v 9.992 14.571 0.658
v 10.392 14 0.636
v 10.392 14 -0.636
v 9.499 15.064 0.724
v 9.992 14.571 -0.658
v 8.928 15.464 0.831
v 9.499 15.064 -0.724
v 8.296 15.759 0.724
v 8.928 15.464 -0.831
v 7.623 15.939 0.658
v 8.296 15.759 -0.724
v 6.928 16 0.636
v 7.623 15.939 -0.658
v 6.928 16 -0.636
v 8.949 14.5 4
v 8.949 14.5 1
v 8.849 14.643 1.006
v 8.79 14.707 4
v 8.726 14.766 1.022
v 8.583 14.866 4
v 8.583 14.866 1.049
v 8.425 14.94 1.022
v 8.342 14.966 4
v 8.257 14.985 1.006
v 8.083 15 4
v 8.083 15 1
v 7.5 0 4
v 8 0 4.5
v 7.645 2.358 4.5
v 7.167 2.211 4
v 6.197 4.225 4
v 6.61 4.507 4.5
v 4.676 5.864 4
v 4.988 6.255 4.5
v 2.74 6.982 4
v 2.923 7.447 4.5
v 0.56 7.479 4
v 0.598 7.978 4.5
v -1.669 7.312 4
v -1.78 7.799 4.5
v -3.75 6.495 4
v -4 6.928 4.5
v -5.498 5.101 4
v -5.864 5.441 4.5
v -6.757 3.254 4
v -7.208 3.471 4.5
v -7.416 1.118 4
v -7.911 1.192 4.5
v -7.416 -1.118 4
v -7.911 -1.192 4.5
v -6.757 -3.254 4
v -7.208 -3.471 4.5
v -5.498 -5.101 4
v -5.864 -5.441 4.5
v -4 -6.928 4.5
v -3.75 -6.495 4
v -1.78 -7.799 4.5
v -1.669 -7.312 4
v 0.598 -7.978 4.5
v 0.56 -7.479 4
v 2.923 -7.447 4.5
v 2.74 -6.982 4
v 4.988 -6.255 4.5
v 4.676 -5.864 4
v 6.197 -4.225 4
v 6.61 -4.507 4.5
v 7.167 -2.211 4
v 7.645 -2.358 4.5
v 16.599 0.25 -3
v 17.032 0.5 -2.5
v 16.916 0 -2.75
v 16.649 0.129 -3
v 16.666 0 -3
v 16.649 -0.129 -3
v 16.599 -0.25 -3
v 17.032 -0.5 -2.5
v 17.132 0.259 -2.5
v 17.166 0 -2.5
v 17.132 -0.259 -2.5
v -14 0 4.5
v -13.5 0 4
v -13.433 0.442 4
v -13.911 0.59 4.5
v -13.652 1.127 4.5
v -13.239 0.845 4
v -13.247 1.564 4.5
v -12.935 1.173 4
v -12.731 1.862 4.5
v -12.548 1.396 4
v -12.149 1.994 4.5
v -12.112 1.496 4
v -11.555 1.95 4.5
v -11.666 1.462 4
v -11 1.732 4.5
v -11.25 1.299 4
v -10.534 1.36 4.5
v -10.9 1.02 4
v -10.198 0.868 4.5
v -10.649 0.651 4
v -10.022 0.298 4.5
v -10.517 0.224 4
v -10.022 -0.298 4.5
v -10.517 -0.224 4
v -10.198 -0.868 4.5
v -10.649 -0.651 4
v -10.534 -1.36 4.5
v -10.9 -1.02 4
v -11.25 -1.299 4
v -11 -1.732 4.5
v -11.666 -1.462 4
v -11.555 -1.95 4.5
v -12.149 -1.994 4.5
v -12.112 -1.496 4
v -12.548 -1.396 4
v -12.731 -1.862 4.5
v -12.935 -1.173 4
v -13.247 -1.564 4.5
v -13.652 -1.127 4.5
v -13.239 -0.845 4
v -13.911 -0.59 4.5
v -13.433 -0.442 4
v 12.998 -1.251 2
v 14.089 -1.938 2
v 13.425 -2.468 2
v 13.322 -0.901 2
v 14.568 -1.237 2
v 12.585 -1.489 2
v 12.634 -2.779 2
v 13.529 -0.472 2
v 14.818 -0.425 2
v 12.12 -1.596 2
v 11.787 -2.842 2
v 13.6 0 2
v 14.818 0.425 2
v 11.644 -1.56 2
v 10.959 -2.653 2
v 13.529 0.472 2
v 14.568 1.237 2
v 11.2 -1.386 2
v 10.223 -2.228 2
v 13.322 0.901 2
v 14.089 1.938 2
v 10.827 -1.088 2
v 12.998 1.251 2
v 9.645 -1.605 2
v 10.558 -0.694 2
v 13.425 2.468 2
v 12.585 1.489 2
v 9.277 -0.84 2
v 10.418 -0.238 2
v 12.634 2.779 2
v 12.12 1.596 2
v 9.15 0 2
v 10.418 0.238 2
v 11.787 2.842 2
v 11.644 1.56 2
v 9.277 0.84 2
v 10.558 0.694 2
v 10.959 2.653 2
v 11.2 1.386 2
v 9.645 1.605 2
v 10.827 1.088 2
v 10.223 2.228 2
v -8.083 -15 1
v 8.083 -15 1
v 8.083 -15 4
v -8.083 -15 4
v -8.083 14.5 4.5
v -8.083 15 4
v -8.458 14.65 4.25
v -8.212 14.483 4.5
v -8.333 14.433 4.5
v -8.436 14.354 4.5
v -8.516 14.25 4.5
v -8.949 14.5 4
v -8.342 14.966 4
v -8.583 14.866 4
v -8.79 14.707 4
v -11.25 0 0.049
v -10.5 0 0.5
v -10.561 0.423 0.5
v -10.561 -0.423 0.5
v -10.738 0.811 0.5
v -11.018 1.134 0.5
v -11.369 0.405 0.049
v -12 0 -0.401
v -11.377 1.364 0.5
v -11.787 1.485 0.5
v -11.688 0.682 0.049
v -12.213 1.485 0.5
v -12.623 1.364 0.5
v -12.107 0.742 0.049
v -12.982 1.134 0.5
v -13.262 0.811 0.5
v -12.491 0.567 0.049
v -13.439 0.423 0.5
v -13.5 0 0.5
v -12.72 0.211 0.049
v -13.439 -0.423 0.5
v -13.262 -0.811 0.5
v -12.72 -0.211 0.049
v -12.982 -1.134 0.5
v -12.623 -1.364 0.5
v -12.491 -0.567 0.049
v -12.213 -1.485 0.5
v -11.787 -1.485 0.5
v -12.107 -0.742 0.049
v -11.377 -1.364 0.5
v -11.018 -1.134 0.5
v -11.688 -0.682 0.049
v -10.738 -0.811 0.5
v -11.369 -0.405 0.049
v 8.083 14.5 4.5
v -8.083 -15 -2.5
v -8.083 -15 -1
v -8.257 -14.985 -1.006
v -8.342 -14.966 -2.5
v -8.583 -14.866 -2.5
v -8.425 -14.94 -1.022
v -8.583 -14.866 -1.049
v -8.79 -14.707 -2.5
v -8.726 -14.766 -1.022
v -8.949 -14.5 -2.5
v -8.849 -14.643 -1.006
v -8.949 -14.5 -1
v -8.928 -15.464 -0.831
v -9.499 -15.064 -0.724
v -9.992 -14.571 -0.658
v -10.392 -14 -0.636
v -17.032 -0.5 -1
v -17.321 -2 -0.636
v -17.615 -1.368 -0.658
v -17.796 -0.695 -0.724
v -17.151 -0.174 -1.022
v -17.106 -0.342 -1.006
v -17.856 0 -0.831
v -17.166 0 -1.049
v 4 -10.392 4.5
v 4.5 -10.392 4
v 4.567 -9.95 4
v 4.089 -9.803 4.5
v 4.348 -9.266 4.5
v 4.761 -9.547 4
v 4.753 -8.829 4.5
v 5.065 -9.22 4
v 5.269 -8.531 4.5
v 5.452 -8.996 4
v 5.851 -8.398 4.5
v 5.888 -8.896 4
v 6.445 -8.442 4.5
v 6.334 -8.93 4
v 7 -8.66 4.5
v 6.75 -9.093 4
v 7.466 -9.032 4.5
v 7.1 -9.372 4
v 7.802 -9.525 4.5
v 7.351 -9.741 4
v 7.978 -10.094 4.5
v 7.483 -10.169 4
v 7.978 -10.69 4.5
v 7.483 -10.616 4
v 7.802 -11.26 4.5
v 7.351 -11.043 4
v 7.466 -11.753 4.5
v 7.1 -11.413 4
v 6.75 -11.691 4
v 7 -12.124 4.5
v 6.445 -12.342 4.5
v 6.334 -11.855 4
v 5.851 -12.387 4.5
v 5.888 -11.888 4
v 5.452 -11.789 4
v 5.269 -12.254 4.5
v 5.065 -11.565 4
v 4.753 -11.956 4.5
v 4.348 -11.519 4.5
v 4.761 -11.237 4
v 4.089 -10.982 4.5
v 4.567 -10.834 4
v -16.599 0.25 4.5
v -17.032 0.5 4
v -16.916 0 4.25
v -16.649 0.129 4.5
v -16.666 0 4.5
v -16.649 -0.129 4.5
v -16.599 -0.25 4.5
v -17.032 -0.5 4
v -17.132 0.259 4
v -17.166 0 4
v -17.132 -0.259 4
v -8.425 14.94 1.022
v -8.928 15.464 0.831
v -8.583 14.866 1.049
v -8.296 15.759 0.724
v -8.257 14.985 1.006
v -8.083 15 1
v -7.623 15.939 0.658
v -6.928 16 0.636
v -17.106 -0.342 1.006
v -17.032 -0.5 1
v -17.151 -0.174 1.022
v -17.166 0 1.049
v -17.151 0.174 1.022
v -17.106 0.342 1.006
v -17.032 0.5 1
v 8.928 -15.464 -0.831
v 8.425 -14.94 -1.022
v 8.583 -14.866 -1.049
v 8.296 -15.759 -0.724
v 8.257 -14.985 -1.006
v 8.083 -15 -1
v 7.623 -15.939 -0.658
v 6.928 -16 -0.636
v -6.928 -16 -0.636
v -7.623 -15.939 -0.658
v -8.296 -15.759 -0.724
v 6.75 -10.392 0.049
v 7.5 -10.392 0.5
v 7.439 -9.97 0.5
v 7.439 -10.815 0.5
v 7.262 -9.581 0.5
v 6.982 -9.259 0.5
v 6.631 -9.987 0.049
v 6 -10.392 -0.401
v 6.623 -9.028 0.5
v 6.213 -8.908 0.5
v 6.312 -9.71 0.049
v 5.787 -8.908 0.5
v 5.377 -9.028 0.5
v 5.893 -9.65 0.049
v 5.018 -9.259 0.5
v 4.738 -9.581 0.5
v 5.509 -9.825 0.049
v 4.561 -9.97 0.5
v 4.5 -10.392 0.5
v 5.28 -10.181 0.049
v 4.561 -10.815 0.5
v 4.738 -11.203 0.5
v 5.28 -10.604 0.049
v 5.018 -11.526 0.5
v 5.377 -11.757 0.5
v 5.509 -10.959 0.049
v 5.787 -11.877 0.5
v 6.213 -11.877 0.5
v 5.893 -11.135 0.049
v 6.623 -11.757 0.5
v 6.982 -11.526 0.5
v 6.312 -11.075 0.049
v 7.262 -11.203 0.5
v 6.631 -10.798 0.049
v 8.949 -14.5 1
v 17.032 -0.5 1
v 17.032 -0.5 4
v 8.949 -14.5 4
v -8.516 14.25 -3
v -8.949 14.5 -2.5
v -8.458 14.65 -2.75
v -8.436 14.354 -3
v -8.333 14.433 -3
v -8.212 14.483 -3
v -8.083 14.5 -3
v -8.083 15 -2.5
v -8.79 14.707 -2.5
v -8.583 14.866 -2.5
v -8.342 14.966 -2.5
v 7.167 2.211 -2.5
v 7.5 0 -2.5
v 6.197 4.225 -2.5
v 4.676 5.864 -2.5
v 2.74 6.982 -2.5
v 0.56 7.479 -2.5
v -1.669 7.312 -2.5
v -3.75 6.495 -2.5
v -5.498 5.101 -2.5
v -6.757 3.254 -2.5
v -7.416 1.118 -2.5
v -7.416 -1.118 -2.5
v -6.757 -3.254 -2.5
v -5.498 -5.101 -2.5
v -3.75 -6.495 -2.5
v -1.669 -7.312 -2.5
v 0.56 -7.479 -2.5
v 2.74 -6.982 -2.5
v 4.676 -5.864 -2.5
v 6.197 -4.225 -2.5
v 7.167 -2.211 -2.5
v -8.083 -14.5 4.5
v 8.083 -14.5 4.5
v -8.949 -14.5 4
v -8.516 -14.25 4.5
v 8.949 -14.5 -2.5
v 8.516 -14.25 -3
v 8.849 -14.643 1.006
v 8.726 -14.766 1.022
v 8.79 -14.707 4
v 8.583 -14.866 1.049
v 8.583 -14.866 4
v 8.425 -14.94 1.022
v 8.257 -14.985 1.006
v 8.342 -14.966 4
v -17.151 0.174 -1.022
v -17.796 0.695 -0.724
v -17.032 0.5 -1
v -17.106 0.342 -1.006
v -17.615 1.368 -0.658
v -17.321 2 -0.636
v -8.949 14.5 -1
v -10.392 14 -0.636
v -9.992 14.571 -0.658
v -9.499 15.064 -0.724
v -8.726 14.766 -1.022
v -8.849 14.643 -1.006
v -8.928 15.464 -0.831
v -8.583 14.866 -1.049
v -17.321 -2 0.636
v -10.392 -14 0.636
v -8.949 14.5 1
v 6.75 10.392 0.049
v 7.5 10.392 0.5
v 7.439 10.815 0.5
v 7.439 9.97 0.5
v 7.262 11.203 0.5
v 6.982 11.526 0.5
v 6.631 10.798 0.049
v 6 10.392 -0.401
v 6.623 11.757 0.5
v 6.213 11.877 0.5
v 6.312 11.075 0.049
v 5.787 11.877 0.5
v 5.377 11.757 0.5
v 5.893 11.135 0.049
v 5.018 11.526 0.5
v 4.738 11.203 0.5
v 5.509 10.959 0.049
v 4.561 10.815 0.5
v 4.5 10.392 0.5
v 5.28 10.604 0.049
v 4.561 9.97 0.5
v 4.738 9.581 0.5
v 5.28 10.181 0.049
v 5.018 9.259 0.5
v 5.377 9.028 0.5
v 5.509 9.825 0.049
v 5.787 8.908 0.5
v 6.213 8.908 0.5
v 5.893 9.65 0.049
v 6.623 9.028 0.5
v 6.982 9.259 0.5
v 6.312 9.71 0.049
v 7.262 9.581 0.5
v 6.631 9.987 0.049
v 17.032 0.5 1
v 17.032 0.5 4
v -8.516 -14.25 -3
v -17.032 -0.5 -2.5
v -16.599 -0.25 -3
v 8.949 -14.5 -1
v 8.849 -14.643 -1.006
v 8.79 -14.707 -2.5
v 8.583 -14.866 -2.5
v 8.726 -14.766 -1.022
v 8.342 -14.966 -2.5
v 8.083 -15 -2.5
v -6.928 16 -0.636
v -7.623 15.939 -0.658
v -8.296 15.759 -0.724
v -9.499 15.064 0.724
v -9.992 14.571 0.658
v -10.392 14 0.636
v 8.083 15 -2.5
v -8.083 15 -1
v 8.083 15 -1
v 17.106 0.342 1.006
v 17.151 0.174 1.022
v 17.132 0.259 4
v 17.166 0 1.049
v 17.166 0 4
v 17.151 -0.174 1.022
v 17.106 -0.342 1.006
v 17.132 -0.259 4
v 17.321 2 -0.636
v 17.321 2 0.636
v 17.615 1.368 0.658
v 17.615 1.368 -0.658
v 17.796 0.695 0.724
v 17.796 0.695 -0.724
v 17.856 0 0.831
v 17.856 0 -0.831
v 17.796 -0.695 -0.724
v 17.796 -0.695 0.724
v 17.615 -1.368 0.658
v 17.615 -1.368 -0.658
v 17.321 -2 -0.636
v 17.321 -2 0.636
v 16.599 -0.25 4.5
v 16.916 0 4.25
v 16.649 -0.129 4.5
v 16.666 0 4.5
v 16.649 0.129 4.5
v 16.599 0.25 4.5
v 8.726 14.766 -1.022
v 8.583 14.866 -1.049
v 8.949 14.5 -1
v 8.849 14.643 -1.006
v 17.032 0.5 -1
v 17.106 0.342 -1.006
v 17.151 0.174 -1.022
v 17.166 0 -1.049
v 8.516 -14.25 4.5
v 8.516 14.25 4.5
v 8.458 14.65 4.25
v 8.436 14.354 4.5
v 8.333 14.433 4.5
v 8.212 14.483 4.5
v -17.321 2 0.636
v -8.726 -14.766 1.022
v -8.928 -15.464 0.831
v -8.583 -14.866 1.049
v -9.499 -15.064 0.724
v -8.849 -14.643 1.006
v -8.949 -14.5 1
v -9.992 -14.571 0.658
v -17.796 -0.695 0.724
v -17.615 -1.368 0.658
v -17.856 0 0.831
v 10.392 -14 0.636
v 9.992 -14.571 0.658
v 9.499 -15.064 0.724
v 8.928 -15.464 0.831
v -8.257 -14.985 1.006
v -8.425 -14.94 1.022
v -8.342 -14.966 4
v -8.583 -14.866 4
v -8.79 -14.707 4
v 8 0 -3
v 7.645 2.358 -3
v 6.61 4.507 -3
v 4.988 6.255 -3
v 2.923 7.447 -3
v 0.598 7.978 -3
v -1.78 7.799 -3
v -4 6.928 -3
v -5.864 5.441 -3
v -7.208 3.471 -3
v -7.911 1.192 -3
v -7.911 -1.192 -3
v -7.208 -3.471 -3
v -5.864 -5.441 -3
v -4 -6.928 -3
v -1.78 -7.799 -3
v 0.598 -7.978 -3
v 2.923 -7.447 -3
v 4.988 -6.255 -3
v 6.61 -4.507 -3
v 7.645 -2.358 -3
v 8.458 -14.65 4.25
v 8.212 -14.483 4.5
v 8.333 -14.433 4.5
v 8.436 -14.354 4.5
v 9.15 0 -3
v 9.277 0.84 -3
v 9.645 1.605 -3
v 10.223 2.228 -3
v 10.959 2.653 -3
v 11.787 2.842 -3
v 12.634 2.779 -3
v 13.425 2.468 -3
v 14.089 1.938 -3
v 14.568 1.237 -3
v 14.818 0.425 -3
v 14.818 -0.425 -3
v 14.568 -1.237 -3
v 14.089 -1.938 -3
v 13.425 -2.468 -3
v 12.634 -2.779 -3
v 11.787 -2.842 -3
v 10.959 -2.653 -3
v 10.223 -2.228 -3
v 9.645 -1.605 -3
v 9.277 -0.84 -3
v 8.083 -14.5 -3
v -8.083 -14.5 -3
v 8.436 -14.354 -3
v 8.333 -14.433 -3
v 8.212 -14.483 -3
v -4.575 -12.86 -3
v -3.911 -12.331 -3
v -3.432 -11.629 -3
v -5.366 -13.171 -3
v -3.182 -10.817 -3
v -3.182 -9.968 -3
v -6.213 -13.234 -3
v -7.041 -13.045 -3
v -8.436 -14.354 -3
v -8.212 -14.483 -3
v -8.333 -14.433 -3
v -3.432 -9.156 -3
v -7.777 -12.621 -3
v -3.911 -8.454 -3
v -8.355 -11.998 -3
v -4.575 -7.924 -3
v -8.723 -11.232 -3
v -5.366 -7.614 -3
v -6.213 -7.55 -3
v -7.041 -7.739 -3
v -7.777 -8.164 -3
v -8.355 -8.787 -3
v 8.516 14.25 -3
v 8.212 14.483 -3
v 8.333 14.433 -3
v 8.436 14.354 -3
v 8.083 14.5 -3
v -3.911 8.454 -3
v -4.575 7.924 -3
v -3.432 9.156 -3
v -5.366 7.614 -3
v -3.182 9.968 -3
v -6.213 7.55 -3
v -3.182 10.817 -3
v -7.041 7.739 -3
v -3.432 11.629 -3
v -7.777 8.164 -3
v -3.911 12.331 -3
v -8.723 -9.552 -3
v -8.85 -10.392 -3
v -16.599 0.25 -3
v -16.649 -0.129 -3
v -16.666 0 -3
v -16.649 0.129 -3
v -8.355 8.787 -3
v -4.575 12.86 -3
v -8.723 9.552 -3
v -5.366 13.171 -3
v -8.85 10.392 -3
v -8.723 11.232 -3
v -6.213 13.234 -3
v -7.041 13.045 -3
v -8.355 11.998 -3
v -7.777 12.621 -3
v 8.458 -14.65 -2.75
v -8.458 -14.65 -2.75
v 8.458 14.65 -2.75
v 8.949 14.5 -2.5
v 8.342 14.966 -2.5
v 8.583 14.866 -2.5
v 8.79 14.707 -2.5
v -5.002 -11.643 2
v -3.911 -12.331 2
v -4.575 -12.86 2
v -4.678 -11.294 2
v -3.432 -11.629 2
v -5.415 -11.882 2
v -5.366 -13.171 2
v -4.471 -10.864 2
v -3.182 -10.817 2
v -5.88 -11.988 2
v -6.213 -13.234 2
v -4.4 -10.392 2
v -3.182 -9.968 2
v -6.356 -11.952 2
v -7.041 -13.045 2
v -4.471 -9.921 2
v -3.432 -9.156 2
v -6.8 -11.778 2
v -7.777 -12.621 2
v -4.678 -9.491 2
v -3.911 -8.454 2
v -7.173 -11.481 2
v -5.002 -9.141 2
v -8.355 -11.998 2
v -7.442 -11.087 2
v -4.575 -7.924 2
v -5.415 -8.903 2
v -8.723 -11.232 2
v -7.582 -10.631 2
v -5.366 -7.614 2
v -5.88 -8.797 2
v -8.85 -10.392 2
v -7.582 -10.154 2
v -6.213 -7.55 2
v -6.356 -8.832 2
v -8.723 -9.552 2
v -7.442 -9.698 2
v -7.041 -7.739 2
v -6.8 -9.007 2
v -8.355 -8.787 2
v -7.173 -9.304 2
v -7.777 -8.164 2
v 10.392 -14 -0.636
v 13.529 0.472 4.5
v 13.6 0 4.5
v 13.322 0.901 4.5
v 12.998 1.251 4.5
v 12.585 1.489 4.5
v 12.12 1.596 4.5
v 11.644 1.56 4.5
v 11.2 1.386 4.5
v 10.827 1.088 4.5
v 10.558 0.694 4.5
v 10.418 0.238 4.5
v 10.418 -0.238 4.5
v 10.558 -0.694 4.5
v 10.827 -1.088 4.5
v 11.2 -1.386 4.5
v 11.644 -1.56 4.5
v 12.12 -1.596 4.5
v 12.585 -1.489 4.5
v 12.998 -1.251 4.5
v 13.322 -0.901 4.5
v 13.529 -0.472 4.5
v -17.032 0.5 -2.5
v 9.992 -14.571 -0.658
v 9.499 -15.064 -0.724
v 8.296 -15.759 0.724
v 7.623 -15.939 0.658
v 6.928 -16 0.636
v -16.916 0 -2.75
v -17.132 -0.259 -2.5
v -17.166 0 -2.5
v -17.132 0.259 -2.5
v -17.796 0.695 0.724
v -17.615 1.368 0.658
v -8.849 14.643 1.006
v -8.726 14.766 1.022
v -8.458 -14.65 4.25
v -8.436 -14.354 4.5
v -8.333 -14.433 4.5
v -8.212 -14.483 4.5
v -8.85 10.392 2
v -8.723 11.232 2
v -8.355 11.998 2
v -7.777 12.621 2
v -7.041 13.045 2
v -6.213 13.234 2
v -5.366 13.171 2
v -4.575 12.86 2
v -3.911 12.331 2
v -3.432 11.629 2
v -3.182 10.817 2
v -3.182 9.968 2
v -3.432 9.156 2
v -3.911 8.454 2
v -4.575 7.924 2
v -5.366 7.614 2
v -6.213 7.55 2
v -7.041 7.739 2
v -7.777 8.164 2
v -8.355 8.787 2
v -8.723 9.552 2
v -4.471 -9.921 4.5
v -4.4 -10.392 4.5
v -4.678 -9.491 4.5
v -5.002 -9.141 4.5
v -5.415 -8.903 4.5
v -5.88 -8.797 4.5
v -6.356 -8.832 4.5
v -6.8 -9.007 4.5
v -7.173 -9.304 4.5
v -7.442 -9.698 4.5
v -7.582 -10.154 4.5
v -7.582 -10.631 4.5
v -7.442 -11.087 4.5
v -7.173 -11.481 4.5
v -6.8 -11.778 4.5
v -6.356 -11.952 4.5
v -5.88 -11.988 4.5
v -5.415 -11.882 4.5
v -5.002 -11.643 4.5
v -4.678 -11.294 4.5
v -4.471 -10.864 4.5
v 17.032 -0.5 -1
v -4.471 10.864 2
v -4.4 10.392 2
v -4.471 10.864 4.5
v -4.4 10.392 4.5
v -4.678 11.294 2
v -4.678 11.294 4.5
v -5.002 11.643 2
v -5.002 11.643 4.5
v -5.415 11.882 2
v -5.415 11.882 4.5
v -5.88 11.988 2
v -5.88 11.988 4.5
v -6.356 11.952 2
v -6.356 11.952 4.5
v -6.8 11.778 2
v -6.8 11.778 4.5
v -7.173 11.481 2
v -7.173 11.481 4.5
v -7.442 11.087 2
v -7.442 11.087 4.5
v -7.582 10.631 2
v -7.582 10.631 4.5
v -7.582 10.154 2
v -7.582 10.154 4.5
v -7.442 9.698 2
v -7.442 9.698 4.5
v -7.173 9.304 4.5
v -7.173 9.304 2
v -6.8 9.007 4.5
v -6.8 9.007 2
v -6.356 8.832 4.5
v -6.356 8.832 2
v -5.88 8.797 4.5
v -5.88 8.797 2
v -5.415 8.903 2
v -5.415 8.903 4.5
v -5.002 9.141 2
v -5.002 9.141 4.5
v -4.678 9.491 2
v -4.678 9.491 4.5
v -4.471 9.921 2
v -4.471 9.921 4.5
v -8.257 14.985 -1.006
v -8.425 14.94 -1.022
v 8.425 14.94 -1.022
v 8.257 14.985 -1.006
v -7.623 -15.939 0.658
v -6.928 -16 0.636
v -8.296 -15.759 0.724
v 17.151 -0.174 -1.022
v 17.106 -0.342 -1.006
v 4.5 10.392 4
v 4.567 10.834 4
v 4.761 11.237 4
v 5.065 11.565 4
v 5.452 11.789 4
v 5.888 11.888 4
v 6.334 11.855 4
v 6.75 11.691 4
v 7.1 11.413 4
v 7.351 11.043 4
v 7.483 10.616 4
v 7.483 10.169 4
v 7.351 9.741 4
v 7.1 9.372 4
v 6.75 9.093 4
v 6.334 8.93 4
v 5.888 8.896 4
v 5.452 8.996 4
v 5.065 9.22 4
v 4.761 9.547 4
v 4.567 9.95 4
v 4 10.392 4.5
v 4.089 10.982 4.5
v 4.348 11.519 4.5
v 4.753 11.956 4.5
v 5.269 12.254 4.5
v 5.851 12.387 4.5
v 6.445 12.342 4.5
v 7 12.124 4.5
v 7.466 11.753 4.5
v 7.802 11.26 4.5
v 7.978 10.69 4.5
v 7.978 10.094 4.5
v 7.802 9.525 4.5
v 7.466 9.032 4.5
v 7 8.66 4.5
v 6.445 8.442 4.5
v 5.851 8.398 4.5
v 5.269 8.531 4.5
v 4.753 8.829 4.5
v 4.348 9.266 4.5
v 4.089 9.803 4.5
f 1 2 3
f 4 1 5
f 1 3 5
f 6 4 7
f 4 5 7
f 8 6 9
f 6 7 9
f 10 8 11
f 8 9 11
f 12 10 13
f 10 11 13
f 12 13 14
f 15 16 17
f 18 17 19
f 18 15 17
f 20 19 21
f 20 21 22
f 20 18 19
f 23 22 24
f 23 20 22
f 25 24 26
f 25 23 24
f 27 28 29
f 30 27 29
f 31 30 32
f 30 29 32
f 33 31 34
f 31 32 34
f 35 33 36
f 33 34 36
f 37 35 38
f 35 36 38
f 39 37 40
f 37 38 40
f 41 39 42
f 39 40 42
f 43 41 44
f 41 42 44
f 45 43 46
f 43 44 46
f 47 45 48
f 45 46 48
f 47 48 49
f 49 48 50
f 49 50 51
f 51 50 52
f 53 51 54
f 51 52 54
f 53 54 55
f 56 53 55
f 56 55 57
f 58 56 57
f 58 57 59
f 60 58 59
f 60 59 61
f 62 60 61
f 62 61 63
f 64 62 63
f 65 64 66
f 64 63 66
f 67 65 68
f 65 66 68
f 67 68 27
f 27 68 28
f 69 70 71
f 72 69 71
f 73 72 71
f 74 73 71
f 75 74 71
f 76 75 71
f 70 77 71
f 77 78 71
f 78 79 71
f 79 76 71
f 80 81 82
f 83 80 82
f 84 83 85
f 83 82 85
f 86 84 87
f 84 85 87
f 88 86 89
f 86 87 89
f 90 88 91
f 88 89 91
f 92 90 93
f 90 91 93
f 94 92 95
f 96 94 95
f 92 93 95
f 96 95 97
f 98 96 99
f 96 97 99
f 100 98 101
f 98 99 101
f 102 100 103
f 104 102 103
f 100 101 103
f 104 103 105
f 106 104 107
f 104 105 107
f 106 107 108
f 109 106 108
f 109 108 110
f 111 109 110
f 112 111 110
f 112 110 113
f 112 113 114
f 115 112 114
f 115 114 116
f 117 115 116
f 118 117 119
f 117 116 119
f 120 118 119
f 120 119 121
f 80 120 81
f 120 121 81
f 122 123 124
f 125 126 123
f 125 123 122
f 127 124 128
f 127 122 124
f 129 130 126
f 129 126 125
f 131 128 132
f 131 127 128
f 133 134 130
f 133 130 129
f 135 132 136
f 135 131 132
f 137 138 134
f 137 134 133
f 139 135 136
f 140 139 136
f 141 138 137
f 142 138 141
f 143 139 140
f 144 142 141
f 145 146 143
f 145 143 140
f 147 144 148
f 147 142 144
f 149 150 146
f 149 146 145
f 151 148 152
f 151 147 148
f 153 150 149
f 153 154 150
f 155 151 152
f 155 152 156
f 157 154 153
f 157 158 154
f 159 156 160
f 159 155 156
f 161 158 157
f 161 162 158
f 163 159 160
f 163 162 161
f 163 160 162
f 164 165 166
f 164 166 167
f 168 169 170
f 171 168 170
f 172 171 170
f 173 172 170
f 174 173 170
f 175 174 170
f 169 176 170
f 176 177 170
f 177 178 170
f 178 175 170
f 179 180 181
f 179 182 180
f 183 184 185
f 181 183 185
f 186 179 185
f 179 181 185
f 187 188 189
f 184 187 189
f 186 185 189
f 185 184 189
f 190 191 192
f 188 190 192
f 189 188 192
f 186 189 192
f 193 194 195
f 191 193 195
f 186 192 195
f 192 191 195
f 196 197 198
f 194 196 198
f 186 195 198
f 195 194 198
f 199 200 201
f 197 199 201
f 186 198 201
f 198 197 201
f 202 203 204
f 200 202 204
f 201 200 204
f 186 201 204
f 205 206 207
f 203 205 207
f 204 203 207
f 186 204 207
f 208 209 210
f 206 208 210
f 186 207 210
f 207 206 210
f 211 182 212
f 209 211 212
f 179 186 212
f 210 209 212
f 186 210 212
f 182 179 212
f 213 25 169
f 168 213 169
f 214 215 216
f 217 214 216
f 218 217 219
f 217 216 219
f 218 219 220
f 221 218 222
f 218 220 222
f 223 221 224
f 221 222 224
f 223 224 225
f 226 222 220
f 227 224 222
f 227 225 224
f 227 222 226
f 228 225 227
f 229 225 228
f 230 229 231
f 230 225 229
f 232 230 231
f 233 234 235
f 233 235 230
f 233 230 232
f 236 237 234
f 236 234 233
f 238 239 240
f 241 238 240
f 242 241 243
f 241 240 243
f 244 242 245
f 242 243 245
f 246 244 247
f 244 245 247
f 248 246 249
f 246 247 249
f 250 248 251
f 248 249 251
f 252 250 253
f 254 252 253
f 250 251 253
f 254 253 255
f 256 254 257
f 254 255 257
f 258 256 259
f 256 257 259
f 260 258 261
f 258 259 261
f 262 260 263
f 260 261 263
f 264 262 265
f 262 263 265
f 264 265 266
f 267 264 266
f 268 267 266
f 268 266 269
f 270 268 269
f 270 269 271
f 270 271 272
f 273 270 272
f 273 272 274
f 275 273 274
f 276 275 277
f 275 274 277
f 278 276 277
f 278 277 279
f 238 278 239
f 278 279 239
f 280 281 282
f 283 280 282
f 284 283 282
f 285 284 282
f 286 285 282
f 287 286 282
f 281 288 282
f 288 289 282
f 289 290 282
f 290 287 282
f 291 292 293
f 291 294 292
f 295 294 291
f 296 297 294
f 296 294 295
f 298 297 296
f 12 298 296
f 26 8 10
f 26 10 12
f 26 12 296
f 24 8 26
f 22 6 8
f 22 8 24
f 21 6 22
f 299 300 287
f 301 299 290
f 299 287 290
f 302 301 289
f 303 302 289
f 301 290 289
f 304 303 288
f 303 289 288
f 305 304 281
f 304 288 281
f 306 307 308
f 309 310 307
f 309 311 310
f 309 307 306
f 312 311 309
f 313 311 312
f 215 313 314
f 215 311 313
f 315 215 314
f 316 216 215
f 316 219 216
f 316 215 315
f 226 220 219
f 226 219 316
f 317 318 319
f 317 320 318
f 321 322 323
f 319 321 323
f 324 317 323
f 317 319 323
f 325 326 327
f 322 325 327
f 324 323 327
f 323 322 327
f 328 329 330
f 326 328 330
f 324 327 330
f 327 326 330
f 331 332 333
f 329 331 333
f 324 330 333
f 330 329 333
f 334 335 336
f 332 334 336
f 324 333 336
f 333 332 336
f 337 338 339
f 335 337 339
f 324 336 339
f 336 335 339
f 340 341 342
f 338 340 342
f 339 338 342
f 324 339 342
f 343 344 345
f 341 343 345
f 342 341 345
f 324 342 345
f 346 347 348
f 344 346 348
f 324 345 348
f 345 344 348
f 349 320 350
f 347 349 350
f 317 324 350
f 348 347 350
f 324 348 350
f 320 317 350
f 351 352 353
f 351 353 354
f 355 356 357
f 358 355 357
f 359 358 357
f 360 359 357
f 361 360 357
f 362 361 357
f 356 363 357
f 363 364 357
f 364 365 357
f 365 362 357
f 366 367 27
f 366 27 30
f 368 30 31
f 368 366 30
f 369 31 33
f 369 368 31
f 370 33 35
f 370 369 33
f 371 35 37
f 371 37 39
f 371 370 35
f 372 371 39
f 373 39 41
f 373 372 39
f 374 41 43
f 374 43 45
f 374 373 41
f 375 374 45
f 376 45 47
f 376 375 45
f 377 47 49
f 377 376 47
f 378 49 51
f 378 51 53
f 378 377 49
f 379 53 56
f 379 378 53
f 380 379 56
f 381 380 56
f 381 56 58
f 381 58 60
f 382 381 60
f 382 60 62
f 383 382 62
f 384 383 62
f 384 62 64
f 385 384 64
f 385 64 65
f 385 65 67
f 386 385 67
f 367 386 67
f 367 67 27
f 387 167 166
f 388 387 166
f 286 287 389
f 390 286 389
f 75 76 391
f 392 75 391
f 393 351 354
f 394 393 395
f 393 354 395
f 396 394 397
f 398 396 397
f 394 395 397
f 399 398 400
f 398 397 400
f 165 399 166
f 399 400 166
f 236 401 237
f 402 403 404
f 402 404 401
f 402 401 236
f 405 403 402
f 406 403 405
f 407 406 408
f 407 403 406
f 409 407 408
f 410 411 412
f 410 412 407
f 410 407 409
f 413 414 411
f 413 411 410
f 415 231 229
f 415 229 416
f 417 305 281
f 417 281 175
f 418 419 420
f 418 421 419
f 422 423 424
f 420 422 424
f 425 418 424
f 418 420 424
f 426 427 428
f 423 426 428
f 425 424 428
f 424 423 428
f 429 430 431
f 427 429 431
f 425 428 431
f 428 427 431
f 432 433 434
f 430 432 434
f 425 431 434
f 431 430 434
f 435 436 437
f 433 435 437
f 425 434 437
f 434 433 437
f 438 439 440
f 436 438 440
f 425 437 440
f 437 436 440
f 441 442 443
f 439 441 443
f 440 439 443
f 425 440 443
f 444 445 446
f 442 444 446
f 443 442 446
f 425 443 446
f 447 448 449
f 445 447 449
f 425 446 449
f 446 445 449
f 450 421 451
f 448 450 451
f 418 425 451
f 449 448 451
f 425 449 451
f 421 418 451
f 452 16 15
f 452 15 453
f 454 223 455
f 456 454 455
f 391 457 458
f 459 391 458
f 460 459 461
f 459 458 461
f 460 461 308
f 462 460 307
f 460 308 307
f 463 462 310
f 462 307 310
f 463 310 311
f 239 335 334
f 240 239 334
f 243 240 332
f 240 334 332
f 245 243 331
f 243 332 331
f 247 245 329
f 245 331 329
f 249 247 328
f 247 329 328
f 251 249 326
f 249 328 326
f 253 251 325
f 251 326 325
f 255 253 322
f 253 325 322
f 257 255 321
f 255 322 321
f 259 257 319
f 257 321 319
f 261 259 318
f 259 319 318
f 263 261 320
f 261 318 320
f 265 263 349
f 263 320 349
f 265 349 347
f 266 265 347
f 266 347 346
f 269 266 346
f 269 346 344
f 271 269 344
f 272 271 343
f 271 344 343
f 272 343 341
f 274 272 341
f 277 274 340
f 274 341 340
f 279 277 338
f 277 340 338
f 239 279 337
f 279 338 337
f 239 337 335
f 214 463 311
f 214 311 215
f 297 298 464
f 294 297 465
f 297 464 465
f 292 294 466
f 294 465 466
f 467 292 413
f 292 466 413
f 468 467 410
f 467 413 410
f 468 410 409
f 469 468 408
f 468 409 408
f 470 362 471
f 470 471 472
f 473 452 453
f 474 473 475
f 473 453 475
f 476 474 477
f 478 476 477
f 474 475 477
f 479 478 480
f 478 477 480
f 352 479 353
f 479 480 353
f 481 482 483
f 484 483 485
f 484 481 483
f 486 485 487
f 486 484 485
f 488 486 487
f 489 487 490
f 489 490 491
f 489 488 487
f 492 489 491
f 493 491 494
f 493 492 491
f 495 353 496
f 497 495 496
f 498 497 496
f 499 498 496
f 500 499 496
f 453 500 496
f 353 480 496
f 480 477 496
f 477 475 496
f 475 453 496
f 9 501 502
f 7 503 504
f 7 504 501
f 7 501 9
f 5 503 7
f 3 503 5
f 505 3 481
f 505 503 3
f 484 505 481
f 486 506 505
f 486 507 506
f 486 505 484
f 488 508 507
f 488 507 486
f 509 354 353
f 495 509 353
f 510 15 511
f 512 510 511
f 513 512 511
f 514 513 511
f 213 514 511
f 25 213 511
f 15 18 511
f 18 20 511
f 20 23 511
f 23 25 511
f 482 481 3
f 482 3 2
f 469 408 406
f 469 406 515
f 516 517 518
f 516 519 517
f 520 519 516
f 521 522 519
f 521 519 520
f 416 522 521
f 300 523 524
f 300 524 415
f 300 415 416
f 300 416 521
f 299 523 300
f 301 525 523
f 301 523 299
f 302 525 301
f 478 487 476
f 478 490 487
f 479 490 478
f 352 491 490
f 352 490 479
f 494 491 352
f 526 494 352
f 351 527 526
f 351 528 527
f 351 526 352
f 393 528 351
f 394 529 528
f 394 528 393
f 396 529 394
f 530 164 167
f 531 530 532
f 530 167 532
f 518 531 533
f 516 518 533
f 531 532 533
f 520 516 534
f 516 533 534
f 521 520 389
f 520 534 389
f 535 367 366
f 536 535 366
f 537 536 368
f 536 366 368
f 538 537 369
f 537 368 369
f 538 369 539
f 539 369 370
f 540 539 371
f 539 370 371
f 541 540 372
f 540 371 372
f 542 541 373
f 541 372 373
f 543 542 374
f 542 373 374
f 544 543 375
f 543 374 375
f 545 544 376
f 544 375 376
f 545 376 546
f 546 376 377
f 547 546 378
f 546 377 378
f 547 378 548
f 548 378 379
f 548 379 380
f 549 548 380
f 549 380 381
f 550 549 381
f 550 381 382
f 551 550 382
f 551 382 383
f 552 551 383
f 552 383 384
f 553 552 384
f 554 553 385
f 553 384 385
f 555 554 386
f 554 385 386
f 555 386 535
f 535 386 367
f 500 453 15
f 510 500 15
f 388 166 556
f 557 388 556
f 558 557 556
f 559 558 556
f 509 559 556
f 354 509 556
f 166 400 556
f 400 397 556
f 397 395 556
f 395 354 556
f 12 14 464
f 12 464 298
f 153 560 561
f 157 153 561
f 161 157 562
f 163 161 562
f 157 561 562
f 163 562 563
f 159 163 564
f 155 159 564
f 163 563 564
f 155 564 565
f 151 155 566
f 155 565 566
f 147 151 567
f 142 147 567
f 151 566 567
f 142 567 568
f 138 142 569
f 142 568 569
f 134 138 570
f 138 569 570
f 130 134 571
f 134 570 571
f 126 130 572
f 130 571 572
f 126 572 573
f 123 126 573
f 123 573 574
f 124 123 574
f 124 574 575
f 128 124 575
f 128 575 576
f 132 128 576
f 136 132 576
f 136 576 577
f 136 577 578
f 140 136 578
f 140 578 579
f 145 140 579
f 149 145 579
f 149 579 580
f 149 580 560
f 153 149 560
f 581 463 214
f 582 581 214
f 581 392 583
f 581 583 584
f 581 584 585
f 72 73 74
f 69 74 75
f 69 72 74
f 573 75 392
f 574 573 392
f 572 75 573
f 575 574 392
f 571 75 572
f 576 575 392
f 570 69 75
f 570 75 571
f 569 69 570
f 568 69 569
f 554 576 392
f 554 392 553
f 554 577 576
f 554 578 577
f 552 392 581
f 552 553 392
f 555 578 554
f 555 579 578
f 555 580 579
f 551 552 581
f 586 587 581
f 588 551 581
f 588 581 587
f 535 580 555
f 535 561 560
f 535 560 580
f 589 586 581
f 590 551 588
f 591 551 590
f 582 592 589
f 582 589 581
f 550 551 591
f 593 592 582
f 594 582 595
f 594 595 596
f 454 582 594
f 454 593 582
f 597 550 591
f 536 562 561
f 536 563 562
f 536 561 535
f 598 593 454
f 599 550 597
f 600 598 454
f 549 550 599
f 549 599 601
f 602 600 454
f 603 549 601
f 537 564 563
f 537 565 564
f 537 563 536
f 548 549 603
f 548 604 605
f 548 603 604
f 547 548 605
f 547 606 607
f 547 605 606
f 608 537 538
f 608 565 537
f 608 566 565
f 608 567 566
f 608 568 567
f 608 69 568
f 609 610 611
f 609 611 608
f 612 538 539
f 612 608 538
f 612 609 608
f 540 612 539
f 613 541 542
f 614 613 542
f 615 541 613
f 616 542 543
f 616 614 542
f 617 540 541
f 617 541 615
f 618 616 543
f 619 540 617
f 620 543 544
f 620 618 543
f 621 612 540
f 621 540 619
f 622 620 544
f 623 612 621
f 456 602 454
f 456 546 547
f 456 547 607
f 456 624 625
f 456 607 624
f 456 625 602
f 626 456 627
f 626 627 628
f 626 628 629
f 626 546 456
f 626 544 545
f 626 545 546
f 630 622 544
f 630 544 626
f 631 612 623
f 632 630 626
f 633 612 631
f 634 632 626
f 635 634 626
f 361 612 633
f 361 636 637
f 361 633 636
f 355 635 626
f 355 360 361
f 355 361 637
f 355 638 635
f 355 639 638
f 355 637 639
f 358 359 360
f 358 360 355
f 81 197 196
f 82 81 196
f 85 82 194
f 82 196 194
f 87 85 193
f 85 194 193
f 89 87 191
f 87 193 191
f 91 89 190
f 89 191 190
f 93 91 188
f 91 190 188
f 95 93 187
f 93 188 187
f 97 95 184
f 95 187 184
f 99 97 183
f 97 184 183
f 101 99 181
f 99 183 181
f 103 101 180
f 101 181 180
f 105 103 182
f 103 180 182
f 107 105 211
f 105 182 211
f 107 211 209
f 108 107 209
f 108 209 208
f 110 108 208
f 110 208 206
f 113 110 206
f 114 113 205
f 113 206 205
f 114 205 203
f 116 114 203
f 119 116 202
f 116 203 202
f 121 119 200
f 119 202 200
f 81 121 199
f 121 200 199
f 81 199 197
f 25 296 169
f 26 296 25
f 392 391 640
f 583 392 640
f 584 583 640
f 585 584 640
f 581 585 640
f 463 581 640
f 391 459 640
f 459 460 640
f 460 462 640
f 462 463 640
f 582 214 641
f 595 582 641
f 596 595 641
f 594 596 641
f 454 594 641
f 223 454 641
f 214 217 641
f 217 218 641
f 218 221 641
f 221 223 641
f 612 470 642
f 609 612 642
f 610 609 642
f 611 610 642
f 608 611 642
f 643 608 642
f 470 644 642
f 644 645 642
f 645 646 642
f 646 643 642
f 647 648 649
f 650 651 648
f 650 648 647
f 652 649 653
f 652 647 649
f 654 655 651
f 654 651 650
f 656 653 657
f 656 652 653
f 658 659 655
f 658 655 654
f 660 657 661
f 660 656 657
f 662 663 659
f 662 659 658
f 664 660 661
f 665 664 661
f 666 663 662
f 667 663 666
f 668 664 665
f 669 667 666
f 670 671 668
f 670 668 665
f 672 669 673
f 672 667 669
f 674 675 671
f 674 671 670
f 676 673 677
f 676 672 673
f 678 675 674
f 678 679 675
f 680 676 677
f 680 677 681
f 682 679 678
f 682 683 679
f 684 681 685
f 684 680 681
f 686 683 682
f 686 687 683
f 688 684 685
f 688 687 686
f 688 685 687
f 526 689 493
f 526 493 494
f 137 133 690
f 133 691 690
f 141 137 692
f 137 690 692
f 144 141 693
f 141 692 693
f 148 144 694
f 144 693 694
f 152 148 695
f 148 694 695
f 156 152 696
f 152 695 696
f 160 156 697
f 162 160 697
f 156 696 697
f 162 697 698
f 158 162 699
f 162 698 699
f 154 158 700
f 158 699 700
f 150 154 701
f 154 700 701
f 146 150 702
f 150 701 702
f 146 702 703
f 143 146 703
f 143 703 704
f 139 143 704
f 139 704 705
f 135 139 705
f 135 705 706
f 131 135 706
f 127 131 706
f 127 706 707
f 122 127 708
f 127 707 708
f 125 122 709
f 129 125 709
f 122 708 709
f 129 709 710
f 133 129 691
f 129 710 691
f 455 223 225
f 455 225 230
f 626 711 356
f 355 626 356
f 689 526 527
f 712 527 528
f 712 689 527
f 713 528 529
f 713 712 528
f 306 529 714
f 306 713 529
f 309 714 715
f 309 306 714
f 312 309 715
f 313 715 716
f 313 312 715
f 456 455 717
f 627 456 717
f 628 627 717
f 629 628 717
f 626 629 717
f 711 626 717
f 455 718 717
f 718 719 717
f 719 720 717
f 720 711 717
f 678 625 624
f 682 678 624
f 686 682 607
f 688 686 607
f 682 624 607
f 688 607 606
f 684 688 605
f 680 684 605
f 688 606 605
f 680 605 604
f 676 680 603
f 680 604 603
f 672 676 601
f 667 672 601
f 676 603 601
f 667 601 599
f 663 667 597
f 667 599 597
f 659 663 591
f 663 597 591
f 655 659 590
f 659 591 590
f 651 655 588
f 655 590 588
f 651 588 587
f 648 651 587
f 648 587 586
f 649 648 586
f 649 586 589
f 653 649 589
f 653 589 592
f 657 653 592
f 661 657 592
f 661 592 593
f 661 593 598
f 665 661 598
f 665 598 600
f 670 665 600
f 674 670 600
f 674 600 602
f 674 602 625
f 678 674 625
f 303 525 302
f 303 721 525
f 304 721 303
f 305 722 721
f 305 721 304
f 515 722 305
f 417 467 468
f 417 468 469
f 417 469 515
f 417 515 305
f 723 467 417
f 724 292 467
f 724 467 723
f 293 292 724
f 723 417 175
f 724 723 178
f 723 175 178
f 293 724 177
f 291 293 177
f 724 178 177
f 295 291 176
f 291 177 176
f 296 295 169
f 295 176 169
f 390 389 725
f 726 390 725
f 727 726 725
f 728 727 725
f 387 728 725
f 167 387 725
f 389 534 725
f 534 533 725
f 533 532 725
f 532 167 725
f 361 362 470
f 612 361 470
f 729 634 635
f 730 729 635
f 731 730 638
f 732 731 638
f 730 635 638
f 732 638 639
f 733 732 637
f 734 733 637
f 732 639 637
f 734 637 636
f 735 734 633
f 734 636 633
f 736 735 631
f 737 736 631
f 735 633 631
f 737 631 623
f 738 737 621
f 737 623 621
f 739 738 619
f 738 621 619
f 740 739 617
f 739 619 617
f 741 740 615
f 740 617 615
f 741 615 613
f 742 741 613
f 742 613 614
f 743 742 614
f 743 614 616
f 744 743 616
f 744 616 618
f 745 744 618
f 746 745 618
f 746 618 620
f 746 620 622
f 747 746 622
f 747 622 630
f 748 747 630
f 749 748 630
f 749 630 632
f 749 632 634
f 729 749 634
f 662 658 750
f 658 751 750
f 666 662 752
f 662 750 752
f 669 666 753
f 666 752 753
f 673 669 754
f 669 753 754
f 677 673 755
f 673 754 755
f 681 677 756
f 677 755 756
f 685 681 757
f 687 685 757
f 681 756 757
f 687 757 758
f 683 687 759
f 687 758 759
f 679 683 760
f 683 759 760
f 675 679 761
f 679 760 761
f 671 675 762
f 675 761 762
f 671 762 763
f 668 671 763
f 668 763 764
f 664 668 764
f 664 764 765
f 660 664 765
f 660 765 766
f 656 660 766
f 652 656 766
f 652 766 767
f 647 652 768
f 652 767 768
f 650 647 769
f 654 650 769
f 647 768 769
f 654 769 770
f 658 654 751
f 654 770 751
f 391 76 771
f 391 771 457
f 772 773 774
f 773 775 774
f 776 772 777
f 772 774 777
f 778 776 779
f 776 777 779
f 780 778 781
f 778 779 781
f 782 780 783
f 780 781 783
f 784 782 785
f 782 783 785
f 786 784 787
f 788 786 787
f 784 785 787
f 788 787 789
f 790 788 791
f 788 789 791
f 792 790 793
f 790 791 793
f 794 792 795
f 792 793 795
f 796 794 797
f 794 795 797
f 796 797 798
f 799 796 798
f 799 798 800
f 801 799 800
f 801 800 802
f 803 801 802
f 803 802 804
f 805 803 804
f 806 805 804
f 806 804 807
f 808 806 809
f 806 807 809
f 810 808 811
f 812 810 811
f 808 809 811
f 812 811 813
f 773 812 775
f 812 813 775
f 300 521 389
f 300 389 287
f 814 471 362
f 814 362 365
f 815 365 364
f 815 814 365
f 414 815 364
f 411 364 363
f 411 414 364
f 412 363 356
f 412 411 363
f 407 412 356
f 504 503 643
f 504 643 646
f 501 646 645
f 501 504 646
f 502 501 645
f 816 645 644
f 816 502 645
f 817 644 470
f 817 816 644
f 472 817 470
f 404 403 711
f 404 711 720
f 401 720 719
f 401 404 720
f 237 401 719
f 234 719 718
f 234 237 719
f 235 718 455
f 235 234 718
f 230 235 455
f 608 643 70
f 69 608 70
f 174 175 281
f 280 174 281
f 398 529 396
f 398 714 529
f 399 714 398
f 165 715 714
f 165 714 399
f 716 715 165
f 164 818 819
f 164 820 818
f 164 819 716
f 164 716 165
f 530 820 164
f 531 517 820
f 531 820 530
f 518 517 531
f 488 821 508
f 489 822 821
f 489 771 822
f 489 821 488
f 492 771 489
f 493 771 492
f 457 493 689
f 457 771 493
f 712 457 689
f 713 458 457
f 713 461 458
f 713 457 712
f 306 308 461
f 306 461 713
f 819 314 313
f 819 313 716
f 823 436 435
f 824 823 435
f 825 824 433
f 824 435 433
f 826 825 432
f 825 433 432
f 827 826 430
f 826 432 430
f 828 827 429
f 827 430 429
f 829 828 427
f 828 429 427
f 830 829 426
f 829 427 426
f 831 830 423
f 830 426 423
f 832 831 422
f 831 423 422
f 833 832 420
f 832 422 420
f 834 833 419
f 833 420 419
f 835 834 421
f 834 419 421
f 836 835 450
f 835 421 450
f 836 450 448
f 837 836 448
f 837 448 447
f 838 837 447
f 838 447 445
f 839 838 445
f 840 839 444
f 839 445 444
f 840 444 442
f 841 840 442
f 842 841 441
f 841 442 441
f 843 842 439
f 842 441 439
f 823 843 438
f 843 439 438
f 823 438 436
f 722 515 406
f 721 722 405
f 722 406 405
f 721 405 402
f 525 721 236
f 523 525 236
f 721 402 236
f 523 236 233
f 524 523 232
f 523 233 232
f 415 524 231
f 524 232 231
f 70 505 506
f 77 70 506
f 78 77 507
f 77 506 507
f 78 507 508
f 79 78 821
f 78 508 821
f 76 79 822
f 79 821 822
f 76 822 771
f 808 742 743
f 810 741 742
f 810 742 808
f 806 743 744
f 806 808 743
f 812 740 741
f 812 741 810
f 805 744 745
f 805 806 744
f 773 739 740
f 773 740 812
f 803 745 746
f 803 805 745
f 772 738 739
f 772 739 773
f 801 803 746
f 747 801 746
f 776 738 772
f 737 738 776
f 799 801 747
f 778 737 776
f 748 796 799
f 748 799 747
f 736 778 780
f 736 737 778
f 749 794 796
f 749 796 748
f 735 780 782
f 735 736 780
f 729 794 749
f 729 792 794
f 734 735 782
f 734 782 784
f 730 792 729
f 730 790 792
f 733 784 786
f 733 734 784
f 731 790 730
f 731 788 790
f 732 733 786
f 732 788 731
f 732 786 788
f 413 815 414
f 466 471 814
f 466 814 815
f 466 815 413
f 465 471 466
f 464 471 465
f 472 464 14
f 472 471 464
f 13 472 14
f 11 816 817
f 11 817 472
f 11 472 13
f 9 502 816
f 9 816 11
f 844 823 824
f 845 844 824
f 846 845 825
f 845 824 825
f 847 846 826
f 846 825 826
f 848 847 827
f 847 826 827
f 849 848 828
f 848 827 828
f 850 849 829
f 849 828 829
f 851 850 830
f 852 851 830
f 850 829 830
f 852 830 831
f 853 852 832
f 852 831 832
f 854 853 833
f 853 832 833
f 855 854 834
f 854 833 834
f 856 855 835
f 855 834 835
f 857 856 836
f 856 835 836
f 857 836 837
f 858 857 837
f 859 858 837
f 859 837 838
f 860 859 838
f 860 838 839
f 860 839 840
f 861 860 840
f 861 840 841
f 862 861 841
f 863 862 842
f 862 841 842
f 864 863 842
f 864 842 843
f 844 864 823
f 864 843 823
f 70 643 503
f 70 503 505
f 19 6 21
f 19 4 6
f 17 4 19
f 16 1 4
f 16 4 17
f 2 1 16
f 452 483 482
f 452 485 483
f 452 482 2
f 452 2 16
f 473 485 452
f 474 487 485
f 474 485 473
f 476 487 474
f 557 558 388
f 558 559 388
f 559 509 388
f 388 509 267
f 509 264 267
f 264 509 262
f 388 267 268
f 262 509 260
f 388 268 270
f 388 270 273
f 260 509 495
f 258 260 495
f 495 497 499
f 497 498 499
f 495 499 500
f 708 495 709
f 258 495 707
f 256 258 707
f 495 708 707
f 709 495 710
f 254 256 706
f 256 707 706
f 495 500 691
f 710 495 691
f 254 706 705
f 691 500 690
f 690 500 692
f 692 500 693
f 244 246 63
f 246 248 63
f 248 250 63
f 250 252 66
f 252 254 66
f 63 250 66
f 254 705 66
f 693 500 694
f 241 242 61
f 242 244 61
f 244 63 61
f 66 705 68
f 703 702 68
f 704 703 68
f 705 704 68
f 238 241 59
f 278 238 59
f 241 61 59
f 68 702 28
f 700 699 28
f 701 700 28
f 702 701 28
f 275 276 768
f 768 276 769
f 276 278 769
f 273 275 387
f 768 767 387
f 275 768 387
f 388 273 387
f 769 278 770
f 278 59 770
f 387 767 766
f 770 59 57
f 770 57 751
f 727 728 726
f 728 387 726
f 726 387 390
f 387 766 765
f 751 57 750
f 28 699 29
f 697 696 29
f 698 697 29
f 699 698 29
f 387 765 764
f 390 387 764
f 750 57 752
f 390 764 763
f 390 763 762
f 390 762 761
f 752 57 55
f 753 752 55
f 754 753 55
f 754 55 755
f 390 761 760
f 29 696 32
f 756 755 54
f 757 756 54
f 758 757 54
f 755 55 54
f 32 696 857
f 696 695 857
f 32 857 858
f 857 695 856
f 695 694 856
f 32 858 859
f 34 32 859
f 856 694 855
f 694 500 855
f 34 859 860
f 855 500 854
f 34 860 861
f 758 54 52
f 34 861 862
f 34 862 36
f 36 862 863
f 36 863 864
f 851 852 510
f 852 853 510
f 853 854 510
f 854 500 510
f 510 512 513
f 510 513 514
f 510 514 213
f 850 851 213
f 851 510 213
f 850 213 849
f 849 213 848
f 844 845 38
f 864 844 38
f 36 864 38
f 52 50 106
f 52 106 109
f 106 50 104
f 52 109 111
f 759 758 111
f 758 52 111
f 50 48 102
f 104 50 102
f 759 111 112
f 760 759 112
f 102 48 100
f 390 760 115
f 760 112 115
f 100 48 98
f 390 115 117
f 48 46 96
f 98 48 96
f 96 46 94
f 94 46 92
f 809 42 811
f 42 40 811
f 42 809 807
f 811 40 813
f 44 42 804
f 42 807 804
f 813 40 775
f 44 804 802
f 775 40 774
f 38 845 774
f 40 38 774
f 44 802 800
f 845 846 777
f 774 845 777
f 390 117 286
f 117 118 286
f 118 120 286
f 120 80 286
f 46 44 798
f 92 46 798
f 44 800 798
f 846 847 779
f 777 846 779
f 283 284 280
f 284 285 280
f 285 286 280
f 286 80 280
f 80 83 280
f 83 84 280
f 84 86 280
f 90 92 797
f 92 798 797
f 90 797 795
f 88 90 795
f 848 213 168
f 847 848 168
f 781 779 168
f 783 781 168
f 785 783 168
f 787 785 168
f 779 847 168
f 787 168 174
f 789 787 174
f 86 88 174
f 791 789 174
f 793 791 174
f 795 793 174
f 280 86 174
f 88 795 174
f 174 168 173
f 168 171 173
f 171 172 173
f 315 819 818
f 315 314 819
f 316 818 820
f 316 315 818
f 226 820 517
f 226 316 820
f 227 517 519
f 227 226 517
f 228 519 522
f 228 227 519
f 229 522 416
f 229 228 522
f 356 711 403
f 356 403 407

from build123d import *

# Parameters (mm, degrees)
SKETCH_1_W                   = 32
SKETCH_1_H                   = 32
SKETCH_1_R                   = 7.5
EXTRUDE_1_DEPTH              = 3
SKETCH_23_W                  = 32
SKETCH_23_H                  = 32
SKETCH_23_R                  = 7.5
EXTRUDE_4_DEPTH              = 1.5
HOLE_WIZARD_M3_1_D           = 3.2
HOLE_WIZARD_M3_1_CBORE_D     = 5.7
HOLE_WIZARD_M3_1_CBORE_DEPTH = 5
F_3_0MM_1_D                  = 3
F_3_0MM_1_DEPTH              = 4
F_3_0MM_1_TIP                = 0.9012909285413404
SKETCH_26_OUTSIDE_W          = 43.174
SKETCH_26_OUTSIDE_H          = 43.174
SKETCH_26_OUTSIDE_R          = 15
CUT_EXTRUDE_1_DEPTH          = 24.837994882120434
EXTRUDE_5_DEPTH              = 7.5
FILLET_1_R                   = 1
CHAMFER_1_SIZE               = 0.5
FILLET_2_R                   = 4


with BuildPart() as part:
    # 草图1 → 凸台-拉伸1 (new, symmetric)
    with BuildSketch(Plane.XY):
        Rectangle(SKETCH_1_W, SKETCH_1_H)
        Circle(SKETCH_1_R, mode=Mode.SUBTRACT)
    extrude(amount=EXTRUDE_1_DEPTH, both=True)

    # 草图23 → 凸台-拉伸4 (add)
    with BuildSketch(Plane.XY.offset(3)):
        Rectangle(SKETCH_23_W, SKETCH_23_H)
        Circle(SKETCH_23_R, mode=Mode.SUBTRACT)
    extrude(amount=EXTRUDE_4_DEPTH)

    # M3 六角圆柱头螺钉的柱形沉头孔1 (through all)
    with Locations(Plane(origin=(0, 0, -3), x_dir=(-1, 0, 0), z_dir=(0, 0, -1))):
        with Locations((-12, 0), (6, 10.392304845), (6, -10.392304845)):
            CounterBoreHole(HOLE_WIZARD_M3_1_D / 2, HOLE_WIZARD_M3_1_CBORE_D / 2, HOLE_WIZARD_M3_1_CBORE_DEPTH)

    # Ø3.0mm 暗销孔1
    with Locations(Plane.XY.offset(4.500000000000001)):
        with Locations((-12, 0), (6, 10.392304845), (6, -10.392304845)):
            Hole(F_3_0MM_1_D / 2, depth=F_3_0MM_1_DEPTH)
            with Locations((0, 0, -(F_3_0MM_1_DEPTH + F_3_0MM_1_TIP / 2))):  # 118° drill point
                Cone(0, F_3_0MM_1_D / 2, F_3_0MM_1_TIP, mode=Mode.SUBTRACT)

    # 草图26 outside → 切除-拉伸1 (cut, through all)
    with BuildSketch(Plane(origin=(0, 0, -3), x_dir=(-1, 0, 0), z_dir=(0, 0, -1))):
        Rectangle(SKETCH_26_OUTSIDE_W, SKETCH_26_OUTSIDE_H)
        Circle(SKETCH_26_OUTSIDE_R, mode=Mode.SUBTRACT)
    extrude(amount=-CUT_EXTRUDE_1_DEPTH, mode=Mode.SUBTRACT)

    # 草图42 → 凸台-拉伸5 (add)
    with BuildSketch(Plane(origin=(0, 0, -3), x_dir=(-1, 0, 0), z_dir=(0, 0, -1))):
        with BuildLine():
            Line((-12.990381096299085, 7.499999931527694), (-17.32050807568877, 0))
            Line((-17.32050807568877, 0), (-12.99038117476846, -7.4999997956147455))
            ThreePointArc((-12.990381174768459, -7.499999795614747), (-15, 7.84693795e-08), (-12.990381096299085, 7.499999931527694))
        make_face()
        with BuildLine():
            ThreePointArc((-3.268098068e-08, -15), (-7.500000116343906, -12.990380989595394), (-12.990381174768459, -7.499999795614747))
            Line((-12.99038117476846, -7.4999997956147455), (-8.660254037844386, -15))
            Line((-8.660254037844386, -15), (-3.268098148e-08, -15))
        make_face()
        with BuildLine():
            Line((-8.660254037844389, 15), (-12.990381096299085, 7.499999931527694))
            ThreePointArc((-12.990381096299085, 7.499999931527694), (-7.500000044953584, 12.990381030812616), (-2.475085045e-08, 15))
            Line((-2.475085026e-08, 15), (-8.660254037844389, 15))
        make_face()
        with BuildLine():
            ThreePointArc((12.990381096299007, -7.499999931527828), (7.500000020084812, -12.990381045170608), (-3.268098068e-08, -15))
            Line((-3.268098148e-08, -15), (8.660254037844389, -15.000000000000002))
            Line((8.660254037844389, -15.000000000000002), (12.990381096299007, -7.499999931527833))
        make_face()
        with BuildLine():
            Line((8.660254037844386, 15.000000000000002), (-2.475085026e-08, 15))
            ThreePointArc((-2.475084712e-08, 15), (7.499999977454134, 12.990381069783442), (12.990381043108282, 7.500000023656865))
            Line((12.990381043108282, 7.500000023656862), (8.660254037844386, 15.000000000000002))
        make_face()
        with BuildLine():
            ThreePointArc((12.990381043108284, 7.500000023656865), (15, 5.319072383e-08), (12.990381096299007, -7.499999931527828))
            Line((12.990381096299007, -7.499999931527833), (17.320508075688775, -5.33e-15))
            Line((17.320508075688775, -5.2e-15), (12.990381043108282, 7.500000023656862))
        make_face()
    extrude(amount=-EXTRUDE_5_DEPTH)

    # 扫描1: sweep along a path in 草图44
    with BuildLine(Plane(origin=(0, 0, -1), x_dir=(-1, 0, 0), z_dir=(0, 0, -1))) as sweep_1_path:
        Line((-8.660254037844389, 15.000000000000002), (-17.32050807568877, -1.73e-15))
        Line((-17.32050807568877, -1.73e-15), (-8.660254037844387, -15))
        Line((-8.660254037844387, -15), (8.660254037844389, -15.000000000000004))
        Line((8.660254037844389, -15.000000000000004), (17.320508075688775, -6.07e-15))
        Line((17.320508075688775, -6.07e-15), (8.660254037844387, 15))
        Line((8.660254037844387, 15), (-8.660254037844389, 15.000000000000002))
    # 草图43 → 扫描1 (sweep)
    with BuildSketch(Plane(origin=(0, 0, 0), x_dir=(0, 0, -1), z_dir=(1, 0, 0))):
        Polygon((-0.9999999999999974, 15.000000000000002), (1, 15.000000000000002), (0.6360297657338008, 16), (-0.6360297657337987, 16), align=None)
    sweep(path=sweep_1_path.line, transition=Transition.RIGHT)

    # 圆角1
    fillet_1_edges = [part.edges().sort_by_distance(p)[0] for p in [
        (-8.660254037844386, 15.000000000000002, 2.7499999999999982),
        (-17.320508075688775, -5.27e-15, 2.7499999999999982),
        (-8.660254037844389, -15.000000000000002, 2.7499999999999982),
        (8.660254037844386, -15, 2.7499999999999982),
        (17.32050807568877, 0, 2.7499999999999982),
        (17.32050807568877, 0, -2),
        (8.660254037844386, -15, -2),
        (-8.660254037844389, -15.000000000000002, -2),
        (-17.320508075688775, -5.27e-15, -2),
        (-8.660254037844386, 15.000000000000002, -2),
        (8.660254037844389, 15, -2),
        (8.660254037844389, 15, 2.7499999999999982),
    ]]
    fillet(fillet_1_edges, radius=FILLET_1_R)

    # 倒角1
    chamfer_1_edges = [part.edges().sort_by_distance(p)[0] for p in [
        (-7.5, 4.25e-15, -3),
        (3.55e-15, 15, 4.5),
        (12.99038105676658, 7.5, 4.5),
        (12.990381056766578, -7.5, 4.5),
        (-12.99038105676658, 7.5, 4.5),
        (-12.990381056766584, -7.500000000000003, 4.5),
        (-1.78e-15, -15, 4.5),
        (-17.165807537309526, -4.64e-15, 4.5),
        (-8.582903768654763, -14.866025403784437, 4.5),
        (8.58290376865476, -14.86602540378444, 4.5),
        (-8.582903768654756, 14.866025403784443, 4.5),
        (17.16580753730952, 1.09e-15, 4.5),
        (-7.5, 4.25e-15, 4.5),
        (8.582903768654763, 14.866025403784437, 4.5),
        (3.55e-15, 15, -3),
        (12.99038105676658, 7.5, -3),
        (12.990381056766578, -7.5, -3),
        (-1.78e-15, -15, -3),
        (-12.990381056766584, -7.500000000000003, -3),
        (-12.99038105676658, 7.5, -3),
        (-17.165807537309526, -4.64e-15, -3),
        (-8.582903768654763, -14.86602540378444, -3),
        (8.58290376865476, -14.866025403784437, -3),
        (-8.582903768654756, 14.866025403784443, -3),
        (17.16580753730952, 1.11e-15, -3),
        (8.582903768654763, 14.866025403784437, -3),
        (7.5, -10.392304845, 4.5),
        (7.5, 10.392304845, 4.5),
        (-10.5, 1.8e-16, 4.5),
    ]]
    chamfer(chamfer_1_edges, length=CHAMFER_1_SIZE)

    # 圆角2
    fillet_2_edges = [part.edges().sort_by_distance(p)[0] for p in [
        (9.237604307034012, -16, -1.11e-15),
        (18.475208614068023, -4.33e-15, -1.11e-15),
        (-9.23760430703402, -16, -1.11e-15),
        (9.23760430703402, 16, -1.11e-15),
        (-18.475208614068023, 3.03e-15, -1.11e-15),
        (-9.23760430703401, 16, -1.11e-15),
    ]]
    fillet(fillet_2_edges, radius=FILLET_2_R)


solid = part.part
